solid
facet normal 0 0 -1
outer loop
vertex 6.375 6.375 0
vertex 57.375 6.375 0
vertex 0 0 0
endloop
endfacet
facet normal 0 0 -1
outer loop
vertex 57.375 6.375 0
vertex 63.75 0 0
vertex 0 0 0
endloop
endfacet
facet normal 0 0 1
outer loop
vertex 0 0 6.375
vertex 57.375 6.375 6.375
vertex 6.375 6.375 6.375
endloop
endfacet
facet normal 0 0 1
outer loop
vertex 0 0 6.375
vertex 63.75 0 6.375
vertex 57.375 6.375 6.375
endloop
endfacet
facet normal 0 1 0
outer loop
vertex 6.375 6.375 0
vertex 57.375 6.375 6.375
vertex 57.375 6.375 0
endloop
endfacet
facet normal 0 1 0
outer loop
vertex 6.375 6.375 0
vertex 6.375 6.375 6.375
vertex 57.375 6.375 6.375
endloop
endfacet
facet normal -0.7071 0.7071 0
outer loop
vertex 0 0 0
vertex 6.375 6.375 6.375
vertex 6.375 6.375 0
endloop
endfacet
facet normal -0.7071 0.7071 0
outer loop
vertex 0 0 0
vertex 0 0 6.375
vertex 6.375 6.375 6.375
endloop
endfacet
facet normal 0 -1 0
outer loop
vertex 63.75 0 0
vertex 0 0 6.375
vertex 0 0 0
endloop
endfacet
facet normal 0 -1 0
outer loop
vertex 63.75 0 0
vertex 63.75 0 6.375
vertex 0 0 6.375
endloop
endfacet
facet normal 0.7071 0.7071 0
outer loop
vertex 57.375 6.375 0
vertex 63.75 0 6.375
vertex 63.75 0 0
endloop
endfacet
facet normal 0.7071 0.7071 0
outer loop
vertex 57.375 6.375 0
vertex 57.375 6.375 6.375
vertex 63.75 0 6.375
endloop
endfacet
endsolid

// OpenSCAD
$fn = 150;

linear_extrude(height = 6.375) {
	polygon(points = [[0, 0], [6.375, 6.375], [57.375, 6.375], [63.75, 0]]);
}
